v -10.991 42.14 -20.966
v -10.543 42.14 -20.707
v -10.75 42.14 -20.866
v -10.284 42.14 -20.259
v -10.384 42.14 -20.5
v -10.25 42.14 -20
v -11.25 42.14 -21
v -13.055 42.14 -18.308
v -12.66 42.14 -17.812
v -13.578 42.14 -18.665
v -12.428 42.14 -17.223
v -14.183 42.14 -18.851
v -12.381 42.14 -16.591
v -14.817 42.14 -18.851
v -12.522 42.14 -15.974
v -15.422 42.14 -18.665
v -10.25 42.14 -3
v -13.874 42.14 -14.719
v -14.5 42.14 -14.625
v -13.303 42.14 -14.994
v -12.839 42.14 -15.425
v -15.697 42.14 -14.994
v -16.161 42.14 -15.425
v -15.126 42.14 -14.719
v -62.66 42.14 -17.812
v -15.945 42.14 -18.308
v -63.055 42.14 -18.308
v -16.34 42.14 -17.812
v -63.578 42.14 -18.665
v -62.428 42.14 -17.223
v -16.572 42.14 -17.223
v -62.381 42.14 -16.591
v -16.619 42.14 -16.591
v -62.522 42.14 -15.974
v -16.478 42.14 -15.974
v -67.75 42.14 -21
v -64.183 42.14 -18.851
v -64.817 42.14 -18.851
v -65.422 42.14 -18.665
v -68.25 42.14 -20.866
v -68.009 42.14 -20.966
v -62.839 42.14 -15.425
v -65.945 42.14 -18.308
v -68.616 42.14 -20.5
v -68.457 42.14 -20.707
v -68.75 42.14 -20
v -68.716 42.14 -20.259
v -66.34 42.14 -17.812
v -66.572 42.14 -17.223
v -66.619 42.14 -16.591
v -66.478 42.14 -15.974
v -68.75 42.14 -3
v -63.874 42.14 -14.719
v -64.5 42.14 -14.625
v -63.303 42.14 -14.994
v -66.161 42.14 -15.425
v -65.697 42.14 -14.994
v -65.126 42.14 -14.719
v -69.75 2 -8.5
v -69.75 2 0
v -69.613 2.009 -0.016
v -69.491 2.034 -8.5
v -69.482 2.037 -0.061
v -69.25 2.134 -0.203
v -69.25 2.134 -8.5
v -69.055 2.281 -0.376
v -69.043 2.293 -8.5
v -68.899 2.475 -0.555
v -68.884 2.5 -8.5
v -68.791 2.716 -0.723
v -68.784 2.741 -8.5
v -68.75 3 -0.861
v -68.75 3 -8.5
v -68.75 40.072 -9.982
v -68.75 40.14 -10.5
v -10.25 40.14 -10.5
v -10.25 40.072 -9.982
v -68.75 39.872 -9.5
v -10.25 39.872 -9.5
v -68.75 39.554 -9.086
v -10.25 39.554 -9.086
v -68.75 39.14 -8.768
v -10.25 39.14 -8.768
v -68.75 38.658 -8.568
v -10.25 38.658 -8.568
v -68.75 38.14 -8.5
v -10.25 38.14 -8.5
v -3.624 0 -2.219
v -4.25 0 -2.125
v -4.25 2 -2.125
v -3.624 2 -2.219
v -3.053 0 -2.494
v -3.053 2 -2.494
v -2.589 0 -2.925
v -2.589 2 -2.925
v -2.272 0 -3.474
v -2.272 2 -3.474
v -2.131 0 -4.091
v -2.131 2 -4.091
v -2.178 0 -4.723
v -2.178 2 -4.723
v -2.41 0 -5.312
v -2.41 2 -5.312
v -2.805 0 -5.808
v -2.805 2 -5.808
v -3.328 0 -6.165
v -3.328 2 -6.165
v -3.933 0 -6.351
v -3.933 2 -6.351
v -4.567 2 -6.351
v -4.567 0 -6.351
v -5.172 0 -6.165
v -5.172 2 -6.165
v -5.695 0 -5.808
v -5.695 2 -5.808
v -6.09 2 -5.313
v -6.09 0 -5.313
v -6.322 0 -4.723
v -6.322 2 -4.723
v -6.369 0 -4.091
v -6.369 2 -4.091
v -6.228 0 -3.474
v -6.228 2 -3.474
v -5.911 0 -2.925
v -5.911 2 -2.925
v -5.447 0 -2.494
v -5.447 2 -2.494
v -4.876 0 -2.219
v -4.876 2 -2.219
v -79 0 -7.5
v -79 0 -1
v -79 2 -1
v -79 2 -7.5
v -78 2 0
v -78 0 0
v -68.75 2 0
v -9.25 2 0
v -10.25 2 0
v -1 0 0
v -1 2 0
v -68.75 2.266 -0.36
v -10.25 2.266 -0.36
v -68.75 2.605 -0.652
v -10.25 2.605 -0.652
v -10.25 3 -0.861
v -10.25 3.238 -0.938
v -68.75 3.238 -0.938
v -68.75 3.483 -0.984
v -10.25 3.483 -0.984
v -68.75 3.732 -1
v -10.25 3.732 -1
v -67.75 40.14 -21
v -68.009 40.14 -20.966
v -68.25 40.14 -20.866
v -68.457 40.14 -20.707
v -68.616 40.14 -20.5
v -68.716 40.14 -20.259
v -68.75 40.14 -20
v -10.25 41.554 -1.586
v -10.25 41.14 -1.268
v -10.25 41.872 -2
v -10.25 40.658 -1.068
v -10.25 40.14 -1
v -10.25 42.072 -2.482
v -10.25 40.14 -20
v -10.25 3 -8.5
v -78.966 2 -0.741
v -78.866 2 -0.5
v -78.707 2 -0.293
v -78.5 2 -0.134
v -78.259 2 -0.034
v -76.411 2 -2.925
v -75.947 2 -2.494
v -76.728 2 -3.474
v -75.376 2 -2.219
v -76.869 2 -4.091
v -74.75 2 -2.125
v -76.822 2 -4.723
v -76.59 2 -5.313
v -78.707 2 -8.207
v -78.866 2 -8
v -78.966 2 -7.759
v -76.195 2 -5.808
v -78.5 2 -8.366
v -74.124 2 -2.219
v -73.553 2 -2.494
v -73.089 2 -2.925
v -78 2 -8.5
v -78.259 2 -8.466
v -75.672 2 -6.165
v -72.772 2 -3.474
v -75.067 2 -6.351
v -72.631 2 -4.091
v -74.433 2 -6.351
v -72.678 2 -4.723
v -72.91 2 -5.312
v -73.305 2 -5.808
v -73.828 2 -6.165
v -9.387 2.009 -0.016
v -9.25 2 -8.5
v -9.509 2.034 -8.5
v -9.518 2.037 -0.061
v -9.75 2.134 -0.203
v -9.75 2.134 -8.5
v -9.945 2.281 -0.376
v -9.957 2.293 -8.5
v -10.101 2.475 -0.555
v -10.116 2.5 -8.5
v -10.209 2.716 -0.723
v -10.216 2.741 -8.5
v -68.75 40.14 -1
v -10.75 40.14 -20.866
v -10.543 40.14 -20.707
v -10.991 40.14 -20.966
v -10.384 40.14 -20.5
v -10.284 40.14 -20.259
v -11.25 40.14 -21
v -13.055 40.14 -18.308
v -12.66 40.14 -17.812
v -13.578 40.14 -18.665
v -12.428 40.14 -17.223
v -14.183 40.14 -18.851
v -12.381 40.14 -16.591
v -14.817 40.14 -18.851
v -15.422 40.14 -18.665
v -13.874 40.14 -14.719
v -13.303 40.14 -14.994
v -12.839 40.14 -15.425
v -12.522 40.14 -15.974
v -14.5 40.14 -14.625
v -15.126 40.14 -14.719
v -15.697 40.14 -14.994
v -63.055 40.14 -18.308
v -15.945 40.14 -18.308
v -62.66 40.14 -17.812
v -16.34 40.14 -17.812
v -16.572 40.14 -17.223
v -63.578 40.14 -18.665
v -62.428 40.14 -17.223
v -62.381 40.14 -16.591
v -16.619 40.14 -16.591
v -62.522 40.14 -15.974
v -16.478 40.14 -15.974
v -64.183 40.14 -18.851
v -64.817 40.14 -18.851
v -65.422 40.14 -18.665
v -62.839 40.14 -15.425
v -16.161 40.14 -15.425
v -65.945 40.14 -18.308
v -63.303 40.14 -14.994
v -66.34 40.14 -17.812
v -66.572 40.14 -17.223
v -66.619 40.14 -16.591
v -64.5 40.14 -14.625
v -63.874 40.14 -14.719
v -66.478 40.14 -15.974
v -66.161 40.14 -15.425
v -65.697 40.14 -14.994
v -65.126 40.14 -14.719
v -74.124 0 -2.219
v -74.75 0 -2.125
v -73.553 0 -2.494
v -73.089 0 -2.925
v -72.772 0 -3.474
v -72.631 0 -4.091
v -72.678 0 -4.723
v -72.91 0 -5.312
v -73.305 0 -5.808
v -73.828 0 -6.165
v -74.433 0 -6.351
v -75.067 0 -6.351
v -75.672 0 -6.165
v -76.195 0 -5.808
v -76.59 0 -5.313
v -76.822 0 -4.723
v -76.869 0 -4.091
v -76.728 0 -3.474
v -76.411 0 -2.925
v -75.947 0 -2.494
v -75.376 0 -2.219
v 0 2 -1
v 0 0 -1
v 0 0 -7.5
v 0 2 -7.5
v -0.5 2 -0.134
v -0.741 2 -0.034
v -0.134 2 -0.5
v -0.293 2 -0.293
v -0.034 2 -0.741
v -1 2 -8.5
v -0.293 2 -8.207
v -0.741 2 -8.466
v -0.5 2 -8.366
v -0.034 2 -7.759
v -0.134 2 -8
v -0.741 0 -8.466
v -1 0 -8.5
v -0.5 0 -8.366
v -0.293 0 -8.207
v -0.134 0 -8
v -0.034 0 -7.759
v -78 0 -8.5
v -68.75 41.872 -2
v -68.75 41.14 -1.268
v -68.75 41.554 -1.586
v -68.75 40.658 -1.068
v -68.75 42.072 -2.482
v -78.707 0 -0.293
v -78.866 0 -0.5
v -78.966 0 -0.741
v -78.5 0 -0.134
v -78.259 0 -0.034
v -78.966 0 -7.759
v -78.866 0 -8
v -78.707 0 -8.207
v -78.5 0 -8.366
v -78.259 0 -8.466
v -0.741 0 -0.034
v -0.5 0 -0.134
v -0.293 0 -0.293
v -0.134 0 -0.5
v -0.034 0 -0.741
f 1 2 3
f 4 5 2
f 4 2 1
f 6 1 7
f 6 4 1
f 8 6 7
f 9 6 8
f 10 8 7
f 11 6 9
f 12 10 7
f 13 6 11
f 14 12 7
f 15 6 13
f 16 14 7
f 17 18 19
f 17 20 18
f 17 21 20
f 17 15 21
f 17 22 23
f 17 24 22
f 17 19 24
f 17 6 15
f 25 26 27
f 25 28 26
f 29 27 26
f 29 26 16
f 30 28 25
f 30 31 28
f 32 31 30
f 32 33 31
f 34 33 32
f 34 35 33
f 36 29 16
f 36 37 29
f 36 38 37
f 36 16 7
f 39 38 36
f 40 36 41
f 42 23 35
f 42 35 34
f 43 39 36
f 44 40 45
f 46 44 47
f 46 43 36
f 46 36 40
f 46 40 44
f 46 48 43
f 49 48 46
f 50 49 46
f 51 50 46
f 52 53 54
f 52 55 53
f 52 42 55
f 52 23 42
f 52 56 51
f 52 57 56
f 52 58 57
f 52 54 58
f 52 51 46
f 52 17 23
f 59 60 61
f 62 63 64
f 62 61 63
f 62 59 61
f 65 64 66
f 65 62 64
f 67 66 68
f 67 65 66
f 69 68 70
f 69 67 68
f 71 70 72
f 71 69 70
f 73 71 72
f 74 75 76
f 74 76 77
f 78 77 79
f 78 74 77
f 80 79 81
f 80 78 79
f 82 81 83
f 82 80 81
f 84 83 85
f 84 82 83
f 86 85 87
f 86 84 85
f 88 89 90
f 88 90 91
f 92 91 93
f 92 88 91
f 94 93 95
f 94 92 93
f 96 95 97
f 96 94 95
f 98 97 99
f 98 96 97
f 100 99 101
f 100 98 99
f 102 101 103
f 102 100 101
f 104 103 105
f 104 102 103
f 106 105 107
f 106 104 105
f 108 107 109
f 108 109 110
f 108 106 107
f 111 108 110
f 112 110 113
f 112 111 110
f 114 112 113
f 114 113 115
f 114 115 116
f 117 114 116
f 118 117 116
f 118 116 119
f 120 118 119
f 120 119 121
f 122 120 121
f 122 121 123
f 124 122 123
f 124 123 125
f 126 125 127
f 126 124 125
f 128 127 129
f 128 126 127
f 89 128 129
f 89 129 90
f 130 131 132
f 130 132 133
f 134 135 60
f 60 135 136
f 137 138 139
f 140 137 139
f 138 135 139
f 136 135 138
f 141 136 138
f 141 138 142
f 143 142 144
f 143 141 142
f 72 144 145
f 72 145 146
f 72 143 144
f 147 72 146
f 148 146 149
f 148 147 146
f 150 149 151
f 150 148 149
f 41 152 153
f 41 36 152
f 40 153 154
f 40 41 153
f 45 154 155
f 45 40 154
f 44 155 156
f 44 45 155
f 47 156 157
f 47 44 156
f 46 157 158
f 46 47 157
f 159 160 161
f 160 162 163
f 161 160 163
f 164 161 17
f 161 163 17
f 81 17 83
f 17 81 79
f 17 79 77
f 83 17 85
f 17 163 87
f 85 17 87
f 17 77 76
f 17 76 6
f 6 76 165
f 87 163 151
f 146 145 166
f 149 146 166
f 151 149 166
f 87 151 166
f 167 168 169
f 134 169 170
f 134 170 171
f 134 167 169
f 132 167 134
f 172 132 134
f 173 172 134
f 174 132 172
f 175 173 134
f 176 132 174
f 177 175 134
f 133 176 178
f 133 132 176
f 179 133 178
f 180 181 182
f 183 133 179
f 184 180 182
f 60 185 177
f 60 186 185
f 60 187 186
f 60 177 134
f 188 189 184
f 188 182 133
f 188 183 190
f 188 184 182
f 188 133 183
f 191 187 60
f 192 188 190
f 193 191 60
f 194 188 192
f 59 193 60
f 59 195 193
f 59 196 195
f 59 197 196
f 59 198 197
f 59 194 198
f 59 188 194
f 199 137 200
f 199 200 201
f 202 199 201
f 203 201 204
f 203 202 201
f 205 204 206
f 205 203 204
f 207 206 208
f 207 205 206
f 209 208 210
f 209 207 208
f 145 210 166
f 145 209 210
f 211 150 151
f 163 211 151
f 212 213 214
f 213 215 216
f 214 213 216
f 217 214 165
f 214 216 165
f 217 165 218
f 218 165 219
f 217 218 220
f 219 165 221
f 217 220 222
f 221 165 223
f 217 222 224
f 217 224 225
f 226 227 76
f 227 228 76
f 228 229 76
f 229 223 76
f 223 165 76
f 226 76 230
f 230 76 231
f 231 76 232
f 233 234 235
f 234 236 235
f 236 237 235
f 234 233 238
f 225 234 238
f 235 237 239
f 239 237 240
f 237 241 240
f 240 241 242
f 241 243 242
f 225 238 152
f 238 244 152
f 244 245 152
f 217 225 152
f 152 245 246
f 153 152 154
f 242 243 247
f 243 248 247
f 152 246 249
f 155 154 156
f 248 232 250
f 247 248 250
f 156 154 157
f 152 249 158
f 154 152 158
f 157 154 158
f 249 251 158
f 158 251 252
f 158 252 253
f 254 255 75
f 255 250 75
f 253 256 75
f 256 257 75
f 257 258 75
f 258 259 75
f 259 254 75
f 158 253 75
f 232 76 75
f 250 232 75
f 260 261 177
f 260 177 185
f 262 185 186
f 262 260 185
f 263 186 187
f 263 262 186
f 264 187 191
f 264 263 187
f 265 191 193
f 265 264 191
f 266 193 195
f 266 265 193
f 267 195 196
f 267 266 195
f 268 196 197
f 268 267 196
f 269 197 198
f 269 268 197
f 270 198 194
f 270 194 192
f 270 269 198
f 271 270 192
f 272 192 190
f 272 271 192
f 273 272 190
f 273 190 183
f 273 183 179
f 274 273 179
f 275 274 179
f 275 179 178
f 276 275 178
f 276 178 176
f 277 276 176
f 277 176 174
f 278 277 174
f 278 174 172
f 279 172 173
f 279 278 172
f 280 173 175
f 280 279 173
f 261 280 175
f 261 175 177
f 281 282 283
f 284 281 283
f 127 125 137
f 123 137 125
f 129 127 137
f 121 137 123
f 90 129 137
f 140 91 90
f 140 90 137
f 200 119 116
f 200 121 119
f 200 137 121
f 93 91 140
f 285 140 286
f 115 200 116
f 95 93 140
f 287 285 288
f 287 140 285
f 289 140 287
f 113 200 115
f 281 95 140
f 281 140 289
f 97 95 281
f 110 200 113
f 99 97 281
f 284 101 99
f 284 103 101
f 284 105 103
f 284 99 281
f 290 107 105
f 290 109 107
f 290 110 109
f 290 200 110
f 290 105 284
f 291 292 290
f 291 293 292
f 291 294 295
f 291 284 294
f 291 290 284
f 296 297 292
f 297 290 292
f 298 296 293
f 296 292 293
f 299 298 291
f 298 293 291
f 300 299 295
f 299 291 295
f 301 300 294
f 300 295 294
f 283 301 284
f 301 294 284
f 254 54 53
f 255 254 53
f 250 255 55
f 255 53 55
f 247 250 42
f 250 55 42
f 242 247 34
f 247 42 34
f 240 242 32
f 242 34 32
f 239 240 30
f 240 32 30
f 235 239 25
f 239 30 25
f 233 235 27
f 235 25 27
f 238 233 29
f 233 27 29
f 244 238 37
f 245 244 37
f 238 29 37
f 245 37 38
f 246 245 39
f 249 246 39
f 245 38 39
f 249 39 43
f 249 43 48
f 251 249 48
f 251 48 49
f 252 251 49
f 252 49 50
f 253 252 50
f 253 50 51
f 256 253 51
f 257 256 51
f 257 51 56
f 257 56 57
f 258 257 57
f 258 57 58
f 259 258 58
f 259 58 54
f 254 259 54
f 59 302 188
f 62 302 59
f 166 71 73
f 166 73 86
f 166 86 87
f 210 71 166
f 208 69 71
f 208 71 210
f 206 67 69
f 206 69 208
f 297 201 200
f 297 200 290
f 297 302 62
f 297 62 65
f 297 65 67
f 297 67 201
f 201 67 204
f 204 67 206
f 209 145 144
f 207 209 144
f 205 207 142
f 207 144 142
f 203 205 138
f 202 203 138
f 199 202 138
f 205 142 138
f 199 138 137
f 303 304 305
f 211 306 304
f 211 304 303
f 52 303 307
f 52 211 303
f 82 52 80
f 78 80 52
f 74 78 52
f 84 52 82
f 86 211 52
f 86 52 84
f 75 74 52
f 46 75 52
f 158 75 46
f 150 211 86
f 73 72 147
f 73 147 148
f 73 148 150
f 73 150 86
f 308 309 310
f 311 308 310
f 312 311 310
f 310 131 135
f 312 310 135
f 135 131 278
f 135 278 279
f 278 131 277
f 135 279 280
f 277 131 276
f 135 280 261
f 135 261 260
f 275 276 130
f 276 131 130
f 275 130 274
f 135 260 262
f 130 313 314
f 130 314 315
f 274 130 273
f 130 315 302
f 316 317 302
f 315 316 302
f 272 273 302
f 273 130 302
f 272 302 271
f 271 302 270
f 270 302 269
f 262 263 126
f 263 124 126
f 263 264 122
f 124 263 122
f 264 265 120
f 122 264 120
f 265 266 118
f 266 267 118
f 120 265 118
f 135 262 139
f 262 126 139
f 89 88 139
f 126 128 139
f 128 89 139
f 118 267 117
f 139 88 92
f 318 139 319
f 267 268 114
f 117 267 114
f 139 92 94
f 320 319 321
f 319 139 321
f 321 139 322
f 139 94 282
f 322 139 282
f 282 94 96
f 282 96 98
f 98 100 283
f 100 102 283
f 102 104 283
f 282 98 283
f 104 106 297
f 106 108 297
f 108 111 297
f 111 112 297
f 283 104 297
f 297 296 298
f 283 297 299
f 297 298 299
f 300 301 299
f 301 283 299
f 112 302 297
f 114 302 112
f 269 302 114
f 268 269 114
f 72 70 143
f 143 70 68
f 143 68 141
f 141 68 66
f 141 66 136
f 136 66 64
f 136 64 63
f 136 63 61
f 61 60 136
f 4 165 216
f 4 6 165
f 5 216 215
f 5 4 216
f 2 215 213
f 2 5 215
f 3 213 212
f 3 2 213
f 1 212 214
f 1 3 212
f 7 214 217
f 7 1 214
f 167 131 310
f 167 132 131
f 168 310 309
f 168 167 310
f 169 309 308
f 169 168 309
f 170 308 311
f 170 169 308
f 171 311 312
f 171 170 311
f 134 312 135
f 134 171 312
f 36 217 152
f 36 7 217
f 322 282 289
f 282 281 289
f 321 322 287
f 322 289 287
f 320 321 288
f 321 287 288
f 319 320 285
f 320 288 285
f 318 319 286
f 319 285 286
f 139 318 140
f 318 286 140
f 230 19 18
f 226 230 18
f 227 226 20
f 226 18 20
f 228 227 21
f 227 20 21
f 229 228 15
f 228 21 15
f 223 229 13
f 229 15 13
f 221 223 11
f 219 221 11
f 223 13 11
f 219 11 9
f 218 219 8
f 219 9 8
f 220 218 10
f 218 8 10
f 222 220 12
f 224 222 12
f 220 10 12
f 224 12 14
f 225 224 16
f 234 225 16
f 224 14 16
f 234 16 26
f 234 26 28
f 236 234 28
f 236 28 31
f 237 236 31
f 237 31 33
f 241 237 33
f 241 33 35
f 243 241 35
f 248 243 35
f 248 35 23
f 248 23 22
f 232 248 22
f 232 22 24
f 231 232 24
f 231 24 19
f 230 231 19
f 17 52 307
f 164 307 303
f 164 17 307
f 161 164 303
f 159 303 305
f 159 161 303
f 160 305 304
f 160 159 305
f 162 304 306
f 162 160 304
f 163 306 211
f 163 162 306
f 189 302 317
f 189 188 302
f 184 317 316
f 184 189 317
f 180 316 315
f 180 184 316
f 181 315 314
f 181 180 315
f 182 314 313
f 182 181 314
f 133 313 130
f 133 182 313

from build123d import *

# Parameters (mm, degrees)
SKETCH1_W           = 79
SKETCH1_H           = 8.5
SKETCH1_R           = 2.125
BOSS_EXTRUDE1_DEPTH = 2
SKETCH3_W           = 58.5
SKETCH3_H           = 7.5
BOSS_EXTRUDE2_DEPTH = 40.14
SKETCH4_W           = 58.5
SKETCH4_H           = 2
BOSS_EXTRUDE3_DEPTH = 12.5
CUT_EXTRUDE1_REACH  = 93.966
SKETCH5_R           = 2.125
FILLET1_R           = 2
FILLET2_R           = 1
FILLET3_R           = 2
FILLET4_R           = 1
FILLET5_R           = 1


with BuildPart() as part:
    # Sketch1 → Boss-Extrude1 (new body)
    with BuildSketch(Plane(origin=(0, 0, 0), x_dir=(1, 0, 0), z_dir=(0, 1, 0))):
        with Locations((-39.5, 4.25)):
            Rectangle(SKETCH1_W, SKETCH1_H)
        with Locations(Location((-74.75, 4.25, 0), (0, 0, 270))):
            Circle(SKETCH1_R, mode=Mode.SUBTRACT)
        with Locations(Location((-4.25, 4.25, 0), (0, 0, 270))):
            Circle(SKETCH1_R, mode=Mode.SUBTRACT)
    extrude(amount=BOSS_EXTRUDE1_DEPTH)

    # Sketch3 → Boss-Extrude2 (add)
    with BuildSketch(Plane(origin=(0, 2, 0), x_dir=(1, 0, 0), z_dir=(0, 1, 0))):
        with Locations((-39.5, 4.75)):
            Rectangle(SKETCH3_W, SKETCH3_H)
    extrude(amount=BOSS_EXTRUDE2_DEPTH)

    # Sketch4 → Boss-Extrude3 (add)
    with BuildSketch(Plane(origin=(0, 0, -8.5), x_dir=(-1, 0, 0), z_dir=(0, 0, -1))):
        with Locations((39.5, 41.14)):
            Rectangle(SKETCH4_W, SKETCH4_H)
    extrude(amount=BOSS_EXTRUDE3_DEPTH)

    # Sketch5 → Cut-Extrude1 (cut, up to next)
    with BuildSketch(Plane(origin=(0, 42.14, 0), x_dir=(1, 0, 0), z_dir=(0, 1, 0)), mode=Mode.PRIVATE) as cut_extrude1_sk1:
        with Locations(Location((-14.5, 16.75, 0), (0, 0, 270))):
            Circle(SKETCH5_R)
    cut_extrude1_tool1 = extrude(cut_extrude1_sk1.sketch, amount=-CUT_EXTRUDE1_REACH, mode=Mode.PRIVATE) & part.part
    # Sketch5 → Cut-Extrude1 (cut, up to next)
    with BuildSketch(Plane(origin=(0, 42.14, 0), x_dir=(1, 0, 0), z_dir=(0, 1, 0)), mode=Mode.PRIVATE) as cut_extrude1_sk2:
        with Locations(Location((-64.5, 16.75, 0), (0, 0, 270))):
            Circle(SKETCH5_R)
    cut_extrude1_tool2 = extrude(cut_extrude1_sk2.sketch, amount=-CUT_EXTRUDE1_REACH, mode=Mode.PRIVATE) & part.part
    add(cut_extrude1_tool1.solids().sort_by_distance((-14.5, 42.14, -16.75))[0], mode=Mode.SUBTRACT)
    add(cut_extrude1_tool2.solids().sort_by_distance((-64.5, 42.14, -16.75))[0], mode=Mode.SUBTRACT)

    # Fillet1
    # the kernel refuses this fillet: 2 mm, written as the material it adds along each edge
    with BuildSketch(Plane(origin=(-68.75, 40.14, -8.5), x_dir=(0, -1, 0), z_dir=(1, 0, 0))) as fillet1_piece_1:
        with BuildLine():
            CenterArc((FILLET1_R, FILLET1_R), FILLET1_R, 180, 90)
            Line((0, FILLET1_R), (-FILLET1_R * 0.02, FILLET1_R))
            Line((-FILLET1_R * 0.02, FILLET1_R), (-FILLET1_R * 0.02, -FILLET1_R * 0.02))
            Line((-FILLET1_R * 0.02, -FILLET1_R * 0.02), (FILLET1_R, -FILLET1_R * 0.02))
            Line((FILLET1_R, -FILLET1_R * 0.02), (FILLET1_R, 0))
        make_face()
    extrude(amount=58.5)
    with BuildSketch(Plane(origin=(-68.75, 2, -1), x_dir=(0, 0, 1), z_dir=(1, 0, 0))) as fillet1_piece_2:
        with BuildLine():
            CenterArc((2, -1.732050808), FILLET1_R, 120, 60)
            Line((0, -1.732050808), (-0.04, -1.732050808))
            Line((-0.04, -1.732050808), (-0.04, 0))
            Line((-0.04, 0), (0, 0.04))
            ThreePointArc((0, 0.04), (0.5, 0.04), (0.98, 0.034641016))
            Line((0.98, 0.034641016), (1, 0))
        make_face()
    extrude(amount=58.5)

    # Fillet2
    fillet2_edges = [part.edges().sort_by_distance(p)[0] for p in [
        (-79, 1, 0),
        (-79, 1, -8.5),
        (-68.75, 41.14, -21),
        (-10.25, 41.14, -21),
        (0, 1, -8.5),
        (0, 1, 0),
    ]]
    fillet(fillet2_edges, radius=FILLET2_R)

    # Fillet3
    fillet3_edges = [part.edges().sort_by_distance(p)[0] for p in [
        (-39.5, 42.14, -1),
    ]]
    fillet(fillet3_edges, radius=FILLET3_R)

    # Fillet4
    # the kernel refuses this fillet: 1 mm, written as the material it adds along each edge
    with BuildSketch(Plane(origin=(-10.25, 2, 0), x_dir=(0, 1, 0), z_dir=(0, 0, -1))) as fillet4_piece_1_section:
        with BuildLine():
            CenterArc((FILLET4_R, FILLET4_R), FILLET4_R, 180, 90)
            Line((0, FILLET4_R), (0, 0))
            Line((0, 0), (FILLET4_R, 0))
        make_face()
    fillet4_piece_1 = extrude(amount=8.5, mode=Mode.PRIVATE)
    fillet4_piece_1 = fillet4_piece_1 - Plane(origin=(-10.019982346, 3.732050808, 1), x_dir=(0, 0, 1), z_dir=(-1, 0, 0)) * Cylinder(2, 21, mode=Mode.PRIVATE)
    add(fillet4_piece_1)

    # Fillet5
    # the kernel refuses this fillet: 1 mm, written as the material it adds along each edge
    with BuildSketch(Plane(origin=(-68.75, 2, -8.5), x_dir=(-1, 0, 0), z_dir=(0, 0, 1))) as fillet5_piece_1_section:
        with BuildLine():
            CenterArc((FILLET5_R, -FILLET5_R), FILLET5_R, 90, 90)
            Line((0, -FILLET5_R), (0, 0))
            Line((0, 0), (FILLET5_R, 0))
        make_face()
    fillet5_piece_1 = extrude(amount=8.5, mode=Mode.PRIVATE)
    fillet5_piece_1 = fillet5_piece_1 - Plane(origin=(-68.980019627, 3.732050808, 1), x_dir=(0, 0, 1), z_dir=(-1, 0, 0)) * Cylinder(2, 21, mode=Mode.PRIVATE)
    add(fillet5_piece_1)


solid = part.part
